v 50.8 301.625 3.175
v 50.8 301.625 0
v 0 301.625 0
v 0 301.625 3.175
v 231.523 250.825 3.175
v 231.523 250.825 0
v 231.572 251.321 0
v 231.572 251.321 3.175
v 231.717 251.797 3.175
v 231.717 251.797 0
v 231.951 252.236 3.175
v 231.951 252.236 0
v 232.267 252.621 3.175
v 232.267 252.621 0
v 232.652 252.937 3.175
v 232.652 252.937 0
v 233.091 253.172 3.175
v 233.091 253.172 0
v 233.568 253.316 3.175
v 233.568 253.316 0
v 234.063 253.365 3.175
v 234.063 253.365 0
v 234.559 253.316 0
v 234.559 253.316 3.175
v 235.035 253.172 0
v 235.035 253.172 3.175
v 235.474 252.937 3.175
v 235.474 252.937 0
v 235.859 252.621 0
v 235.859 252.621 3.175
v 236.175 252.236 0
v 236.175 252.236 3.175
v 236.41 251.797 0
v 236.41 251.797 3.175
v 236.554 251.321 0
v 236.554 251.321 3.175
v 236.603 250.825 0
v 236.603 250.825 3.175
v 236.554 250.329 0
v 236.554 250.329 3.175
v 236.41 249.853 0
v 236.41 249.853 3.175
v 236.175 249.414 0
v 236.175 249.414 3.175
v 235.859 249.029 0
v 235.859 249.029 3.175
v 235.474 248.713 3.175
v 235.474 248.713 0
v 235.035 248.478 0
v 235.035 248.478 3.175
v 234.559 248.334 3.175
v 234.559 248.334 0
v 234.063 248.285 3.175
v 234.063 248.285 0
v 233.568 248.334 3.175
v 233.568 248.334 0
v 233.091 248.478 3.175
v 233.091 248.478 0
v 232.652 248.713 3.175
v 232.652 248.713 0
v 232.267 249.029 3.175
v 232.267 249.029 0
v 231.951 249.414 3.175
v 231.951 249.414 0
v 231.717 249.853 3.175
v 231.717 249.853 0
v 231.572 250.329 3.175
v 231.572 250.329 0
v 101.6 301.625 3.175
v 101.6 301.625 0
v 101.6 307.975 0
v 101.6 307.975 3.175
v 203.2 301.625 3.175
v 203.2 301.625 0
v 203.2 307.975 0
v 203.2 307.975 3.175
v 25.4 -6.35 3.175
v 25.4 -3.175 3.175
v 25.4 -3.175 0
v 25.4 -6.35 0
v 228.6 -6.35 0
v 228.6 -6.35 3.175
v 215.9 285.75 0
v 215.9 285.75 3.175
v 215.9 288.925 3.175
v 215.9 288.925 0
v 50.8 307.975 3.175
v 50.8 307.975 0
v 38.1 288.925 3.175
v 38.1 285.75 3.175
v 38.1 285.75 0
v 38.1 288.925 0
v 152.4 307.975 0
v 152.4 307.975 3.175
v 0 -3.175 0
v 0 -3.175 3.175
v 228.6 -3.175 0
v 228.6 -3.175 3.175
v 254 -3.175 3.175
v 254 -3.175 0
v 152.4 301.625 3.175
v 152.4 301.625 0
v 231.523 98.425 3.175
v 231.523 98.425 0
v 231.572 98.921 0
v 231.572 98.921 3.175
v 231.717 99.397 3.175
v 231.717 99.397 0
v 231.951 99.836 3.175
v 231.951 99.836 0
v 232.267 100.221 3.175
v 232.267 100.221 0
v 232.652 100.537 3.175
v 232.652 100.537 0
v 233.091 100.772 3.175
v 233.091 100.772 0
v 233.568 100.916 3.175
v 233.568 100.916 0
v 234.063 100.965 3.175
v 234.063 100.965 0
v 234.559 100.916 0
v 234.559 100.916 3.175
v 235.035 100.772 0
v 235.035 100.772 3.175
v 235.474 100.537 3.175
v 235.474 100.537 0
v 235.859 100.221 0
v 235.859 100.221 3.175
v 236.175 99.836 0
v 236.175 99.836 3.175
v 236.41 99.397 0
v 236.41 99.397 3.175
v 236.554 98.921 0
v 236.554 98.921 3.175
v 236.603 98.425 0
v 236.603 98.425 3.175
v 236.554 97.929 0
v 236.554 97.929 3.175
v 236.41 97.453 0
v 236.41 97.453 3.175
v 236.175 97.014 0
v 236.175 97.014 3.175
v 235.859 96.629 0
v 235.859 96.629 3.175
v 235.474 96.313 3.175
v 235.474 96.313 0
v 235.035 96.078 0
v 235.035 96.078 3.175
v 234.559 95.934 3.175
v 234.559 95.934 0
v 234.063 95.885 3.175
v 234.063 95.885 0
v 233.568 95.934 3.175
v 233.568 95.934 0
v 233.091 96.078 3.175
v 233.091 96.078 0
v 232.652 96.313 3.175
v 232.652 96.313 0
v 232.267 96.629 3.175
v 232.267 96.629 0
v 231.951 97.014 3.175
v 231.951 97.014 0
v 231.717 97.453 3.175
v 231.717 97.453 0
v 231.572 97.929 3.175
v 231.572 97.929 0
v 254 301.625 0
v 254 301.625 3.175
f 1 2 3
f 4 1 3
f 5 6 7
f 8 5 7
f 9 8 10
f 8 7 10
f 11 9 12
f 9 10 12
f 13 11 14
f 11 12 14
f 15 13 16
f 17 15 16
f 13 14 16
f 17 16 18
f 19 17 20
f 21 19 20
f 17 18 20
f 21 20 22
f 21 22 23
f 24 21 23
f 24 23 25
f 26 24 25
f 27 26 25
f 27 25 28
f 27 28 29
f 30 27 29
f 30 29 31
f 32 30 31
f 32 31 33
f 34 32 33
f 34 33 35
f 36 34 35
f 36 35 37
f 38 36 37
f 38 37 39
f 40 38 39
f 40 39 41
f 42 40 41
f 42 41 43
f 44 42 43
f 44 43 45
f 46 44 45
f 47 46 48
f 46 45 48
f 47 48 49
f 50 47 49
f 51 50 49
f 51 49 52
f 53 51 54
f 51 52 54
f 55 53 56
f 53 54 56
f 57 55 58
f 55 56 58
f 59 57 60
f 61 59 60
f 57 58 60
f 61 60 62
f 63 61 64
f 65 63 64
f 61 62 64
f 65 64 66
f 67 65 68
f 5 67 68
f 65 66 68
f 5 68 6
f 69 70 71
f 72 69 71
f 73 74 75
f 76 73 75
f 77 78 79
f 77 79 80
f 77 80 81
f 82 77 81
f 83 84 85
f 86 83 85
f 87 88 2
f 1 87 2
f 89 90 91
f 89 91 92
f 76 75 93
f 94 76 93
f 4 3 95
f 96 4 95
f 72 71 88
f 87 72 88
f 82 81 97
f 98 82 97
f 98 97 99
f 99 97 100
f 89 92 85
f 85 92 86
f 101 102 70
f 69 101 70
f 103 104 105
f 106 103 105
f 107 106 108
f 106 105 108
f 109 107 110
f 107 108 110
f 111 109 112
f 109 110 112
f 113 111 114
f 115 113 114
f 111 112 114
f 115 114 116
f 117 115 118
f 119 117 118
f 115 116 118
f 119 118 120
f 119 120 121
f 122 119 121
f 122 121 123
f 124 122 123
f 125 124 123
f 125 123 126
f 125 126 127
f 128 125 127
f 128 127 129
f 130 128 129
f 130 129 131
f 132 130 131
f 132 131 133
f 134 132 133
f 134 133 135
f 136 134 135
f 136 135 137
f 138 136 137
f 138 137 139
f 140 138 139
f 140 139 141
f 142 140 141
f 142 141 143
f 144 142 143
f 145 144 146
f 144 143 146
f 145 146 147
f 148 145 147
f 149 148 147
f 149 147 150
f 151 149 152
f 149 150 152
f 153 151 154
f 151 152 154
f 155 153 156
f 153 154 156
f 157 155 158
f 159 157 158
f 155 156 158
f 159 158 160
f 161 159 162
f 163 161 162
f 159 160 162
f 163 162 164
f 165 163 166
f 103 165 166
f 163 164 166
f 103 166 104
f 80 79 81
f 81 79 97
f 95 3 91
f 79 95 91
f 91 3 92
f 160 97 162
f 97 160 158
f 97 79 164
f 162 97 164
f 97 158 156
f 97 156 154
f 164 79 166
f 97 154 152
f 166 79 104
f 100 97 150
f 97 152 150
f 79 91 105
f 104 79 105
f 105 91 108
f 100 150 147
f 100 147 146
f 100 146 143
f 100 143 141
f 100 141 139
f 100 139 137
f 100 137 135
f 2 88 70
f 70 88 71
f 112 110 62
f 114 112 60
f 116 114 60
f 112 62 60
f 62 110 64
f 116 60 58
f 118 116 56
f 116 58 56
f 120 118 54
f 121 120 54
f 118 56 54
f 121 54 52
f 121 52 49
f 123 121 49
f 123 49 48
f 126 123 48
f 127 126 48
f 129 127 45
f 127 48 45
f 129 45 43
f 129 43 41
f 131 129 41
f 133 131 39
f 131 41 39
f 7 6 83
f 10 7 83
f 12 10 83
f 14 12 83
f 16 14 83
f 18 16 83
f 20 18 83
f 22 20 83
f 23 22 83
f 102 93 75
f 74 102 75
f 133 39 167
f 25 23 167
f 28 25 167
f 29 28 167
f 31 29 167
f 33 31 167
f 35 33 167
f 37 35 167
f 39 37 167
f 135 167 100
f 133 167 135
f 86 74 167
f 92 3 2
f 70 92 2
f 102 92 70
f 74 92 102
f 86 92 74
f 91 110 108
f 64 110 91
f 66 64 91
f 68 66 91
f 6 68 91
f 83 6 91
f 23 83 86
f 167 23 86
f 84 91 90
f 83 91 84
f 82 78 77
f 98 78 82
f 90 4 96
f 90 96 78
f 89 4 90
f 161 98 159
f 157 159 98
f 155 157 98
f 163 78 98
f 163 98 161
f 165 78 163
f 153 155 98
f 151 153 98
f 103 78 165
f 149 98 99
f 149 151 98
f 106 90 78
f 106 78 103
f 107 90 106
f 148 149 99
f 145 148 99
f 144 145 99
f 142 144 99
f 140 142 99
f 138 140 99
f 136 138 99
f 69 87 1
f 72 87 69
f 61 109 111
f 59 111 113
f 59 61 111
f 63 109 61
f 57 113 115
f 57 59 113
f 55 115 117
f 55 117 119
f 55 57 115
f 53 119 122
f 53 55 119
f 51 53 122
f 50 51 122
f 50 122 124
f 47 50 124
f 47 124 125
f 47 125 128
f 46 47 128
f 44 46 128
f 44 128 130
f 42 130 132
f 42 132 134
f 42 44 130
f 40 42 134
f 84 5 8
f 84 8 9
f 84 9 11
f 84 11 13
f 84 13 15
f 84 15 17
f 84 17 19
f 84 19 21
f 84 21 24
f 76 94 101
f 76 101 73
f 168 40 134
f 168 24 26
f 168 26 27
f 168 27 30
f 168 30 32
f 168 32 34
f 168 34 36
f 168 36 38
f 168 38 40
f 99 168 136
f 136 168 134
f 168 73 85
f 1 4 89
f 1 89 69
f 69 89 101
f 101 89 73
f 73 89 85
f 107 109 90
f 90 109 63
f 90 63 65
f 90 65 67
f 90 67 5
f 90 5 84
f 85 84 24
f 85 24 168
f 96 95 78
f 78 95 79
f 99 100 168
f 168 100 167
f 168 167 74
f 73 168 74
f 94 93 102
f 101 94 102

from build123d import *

# Parameters (mm, degrees)
SKETCH1_W           = 177.8
SKETCH1_H           = 3.175
BOSS_EXTRUDE1_DEPTH = 3.175
SKETCH2_R           = 2.54
CUT_EXTRUDE1_DEPTH  = 4.175


with BuildPart() as part:
    # Sketch1 → Boss-Extrude1 (new body)
    with BuildSketch(Plane.XY):
        Polygon((228.6, -6.35), (228.6, -3.175), (254, -3.175), (254, 301.625), (203.2, 301.625), (203.2, 307.975), (152.4, 307.975), (152.4, 301.625), (101.6, 301.625), (101.6, 307.975), (50.8, 307.975), (50.8, 301.625), (0, 301.625), (0, -3.175), (25.4, -3.175), (25.4, -6.35), align=None)
        with Locations((127, 287.3375)):
            Rectangle(SKETCH1_W, SKETCH1_H, mode=Mode.SUBTRACT)
    extrude(amount=BOSS_EXTRUDE1_DEPTH)

    # Sketch2 → Cut-Extrude1 (cut, through all)
    with BuildSketch(Plane(origin=(0, 0, 0), x_dir=(-1, 0, 0), z_dir=(0, 0, -1))):
        with Locations((-234.063292103, 250.825)):
            Circle(SKETCH2_R)
        with Locations((-234.063292103, 98.425)):
            Circle(SKETCH2_R)
    extrude(amount=-CUT_EXTRUDE1_DEPTH, mode=Mode.SUBTRACT)


solid = part.part
